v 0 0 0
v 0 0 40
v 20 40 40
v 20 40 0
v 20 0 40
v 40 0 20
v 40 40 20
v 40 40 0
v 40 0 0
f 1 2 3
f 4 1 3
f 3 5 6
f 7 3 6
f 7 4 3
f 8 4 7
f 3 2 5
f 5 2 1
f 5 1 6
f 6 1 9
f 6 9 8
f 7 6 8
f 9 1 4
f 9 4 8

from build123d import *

# Parameters (mm, degrees)
SKETCH1_W           = 40
SKETCH1_H           = 40
BOSS_EXTRUDE1_DEPTH = 40
CUT_EXTRUDE1_DEPTH  = 40
CUT_EXTRUDE2_DEPTH  = 40


with BuildPart() as part:
    # Sketch1 → Boss-Extrude1 (new body)
    with BuildSketch(Plane.XY):
        with Locations((20, 20)):
            Rectangle(SKETCH1_W, SKETCH1_H)
    extrude(amount=BOSS_EXTRUDE1_DEPTH)

    # Sketch2 → Cut-Extrude1 (cut)
    with BuildSketch(Plane.XY.offset(40)):
        Polygon((0, 0), (20, 40), (0, 40), align=None)
    extrude(amount=-CUT_EXTRUDE1_DEPTH, mode=Mode.SUBTRACT)

    # Sketch3 → Cut-Extrude2 (cut)
    with BuildSketch(Plane(origin=(0, 40, 0), x_dir=(1, 0, 0), z_dir=(0, 1, 0))):
        Polygon((20, -40), (40, -20), (40, -40), align=None)
    extrude(amount=-CUT_EXTRUDE2_DEPTH, mode=Mode.SUBTRACT)


solid = part.part
